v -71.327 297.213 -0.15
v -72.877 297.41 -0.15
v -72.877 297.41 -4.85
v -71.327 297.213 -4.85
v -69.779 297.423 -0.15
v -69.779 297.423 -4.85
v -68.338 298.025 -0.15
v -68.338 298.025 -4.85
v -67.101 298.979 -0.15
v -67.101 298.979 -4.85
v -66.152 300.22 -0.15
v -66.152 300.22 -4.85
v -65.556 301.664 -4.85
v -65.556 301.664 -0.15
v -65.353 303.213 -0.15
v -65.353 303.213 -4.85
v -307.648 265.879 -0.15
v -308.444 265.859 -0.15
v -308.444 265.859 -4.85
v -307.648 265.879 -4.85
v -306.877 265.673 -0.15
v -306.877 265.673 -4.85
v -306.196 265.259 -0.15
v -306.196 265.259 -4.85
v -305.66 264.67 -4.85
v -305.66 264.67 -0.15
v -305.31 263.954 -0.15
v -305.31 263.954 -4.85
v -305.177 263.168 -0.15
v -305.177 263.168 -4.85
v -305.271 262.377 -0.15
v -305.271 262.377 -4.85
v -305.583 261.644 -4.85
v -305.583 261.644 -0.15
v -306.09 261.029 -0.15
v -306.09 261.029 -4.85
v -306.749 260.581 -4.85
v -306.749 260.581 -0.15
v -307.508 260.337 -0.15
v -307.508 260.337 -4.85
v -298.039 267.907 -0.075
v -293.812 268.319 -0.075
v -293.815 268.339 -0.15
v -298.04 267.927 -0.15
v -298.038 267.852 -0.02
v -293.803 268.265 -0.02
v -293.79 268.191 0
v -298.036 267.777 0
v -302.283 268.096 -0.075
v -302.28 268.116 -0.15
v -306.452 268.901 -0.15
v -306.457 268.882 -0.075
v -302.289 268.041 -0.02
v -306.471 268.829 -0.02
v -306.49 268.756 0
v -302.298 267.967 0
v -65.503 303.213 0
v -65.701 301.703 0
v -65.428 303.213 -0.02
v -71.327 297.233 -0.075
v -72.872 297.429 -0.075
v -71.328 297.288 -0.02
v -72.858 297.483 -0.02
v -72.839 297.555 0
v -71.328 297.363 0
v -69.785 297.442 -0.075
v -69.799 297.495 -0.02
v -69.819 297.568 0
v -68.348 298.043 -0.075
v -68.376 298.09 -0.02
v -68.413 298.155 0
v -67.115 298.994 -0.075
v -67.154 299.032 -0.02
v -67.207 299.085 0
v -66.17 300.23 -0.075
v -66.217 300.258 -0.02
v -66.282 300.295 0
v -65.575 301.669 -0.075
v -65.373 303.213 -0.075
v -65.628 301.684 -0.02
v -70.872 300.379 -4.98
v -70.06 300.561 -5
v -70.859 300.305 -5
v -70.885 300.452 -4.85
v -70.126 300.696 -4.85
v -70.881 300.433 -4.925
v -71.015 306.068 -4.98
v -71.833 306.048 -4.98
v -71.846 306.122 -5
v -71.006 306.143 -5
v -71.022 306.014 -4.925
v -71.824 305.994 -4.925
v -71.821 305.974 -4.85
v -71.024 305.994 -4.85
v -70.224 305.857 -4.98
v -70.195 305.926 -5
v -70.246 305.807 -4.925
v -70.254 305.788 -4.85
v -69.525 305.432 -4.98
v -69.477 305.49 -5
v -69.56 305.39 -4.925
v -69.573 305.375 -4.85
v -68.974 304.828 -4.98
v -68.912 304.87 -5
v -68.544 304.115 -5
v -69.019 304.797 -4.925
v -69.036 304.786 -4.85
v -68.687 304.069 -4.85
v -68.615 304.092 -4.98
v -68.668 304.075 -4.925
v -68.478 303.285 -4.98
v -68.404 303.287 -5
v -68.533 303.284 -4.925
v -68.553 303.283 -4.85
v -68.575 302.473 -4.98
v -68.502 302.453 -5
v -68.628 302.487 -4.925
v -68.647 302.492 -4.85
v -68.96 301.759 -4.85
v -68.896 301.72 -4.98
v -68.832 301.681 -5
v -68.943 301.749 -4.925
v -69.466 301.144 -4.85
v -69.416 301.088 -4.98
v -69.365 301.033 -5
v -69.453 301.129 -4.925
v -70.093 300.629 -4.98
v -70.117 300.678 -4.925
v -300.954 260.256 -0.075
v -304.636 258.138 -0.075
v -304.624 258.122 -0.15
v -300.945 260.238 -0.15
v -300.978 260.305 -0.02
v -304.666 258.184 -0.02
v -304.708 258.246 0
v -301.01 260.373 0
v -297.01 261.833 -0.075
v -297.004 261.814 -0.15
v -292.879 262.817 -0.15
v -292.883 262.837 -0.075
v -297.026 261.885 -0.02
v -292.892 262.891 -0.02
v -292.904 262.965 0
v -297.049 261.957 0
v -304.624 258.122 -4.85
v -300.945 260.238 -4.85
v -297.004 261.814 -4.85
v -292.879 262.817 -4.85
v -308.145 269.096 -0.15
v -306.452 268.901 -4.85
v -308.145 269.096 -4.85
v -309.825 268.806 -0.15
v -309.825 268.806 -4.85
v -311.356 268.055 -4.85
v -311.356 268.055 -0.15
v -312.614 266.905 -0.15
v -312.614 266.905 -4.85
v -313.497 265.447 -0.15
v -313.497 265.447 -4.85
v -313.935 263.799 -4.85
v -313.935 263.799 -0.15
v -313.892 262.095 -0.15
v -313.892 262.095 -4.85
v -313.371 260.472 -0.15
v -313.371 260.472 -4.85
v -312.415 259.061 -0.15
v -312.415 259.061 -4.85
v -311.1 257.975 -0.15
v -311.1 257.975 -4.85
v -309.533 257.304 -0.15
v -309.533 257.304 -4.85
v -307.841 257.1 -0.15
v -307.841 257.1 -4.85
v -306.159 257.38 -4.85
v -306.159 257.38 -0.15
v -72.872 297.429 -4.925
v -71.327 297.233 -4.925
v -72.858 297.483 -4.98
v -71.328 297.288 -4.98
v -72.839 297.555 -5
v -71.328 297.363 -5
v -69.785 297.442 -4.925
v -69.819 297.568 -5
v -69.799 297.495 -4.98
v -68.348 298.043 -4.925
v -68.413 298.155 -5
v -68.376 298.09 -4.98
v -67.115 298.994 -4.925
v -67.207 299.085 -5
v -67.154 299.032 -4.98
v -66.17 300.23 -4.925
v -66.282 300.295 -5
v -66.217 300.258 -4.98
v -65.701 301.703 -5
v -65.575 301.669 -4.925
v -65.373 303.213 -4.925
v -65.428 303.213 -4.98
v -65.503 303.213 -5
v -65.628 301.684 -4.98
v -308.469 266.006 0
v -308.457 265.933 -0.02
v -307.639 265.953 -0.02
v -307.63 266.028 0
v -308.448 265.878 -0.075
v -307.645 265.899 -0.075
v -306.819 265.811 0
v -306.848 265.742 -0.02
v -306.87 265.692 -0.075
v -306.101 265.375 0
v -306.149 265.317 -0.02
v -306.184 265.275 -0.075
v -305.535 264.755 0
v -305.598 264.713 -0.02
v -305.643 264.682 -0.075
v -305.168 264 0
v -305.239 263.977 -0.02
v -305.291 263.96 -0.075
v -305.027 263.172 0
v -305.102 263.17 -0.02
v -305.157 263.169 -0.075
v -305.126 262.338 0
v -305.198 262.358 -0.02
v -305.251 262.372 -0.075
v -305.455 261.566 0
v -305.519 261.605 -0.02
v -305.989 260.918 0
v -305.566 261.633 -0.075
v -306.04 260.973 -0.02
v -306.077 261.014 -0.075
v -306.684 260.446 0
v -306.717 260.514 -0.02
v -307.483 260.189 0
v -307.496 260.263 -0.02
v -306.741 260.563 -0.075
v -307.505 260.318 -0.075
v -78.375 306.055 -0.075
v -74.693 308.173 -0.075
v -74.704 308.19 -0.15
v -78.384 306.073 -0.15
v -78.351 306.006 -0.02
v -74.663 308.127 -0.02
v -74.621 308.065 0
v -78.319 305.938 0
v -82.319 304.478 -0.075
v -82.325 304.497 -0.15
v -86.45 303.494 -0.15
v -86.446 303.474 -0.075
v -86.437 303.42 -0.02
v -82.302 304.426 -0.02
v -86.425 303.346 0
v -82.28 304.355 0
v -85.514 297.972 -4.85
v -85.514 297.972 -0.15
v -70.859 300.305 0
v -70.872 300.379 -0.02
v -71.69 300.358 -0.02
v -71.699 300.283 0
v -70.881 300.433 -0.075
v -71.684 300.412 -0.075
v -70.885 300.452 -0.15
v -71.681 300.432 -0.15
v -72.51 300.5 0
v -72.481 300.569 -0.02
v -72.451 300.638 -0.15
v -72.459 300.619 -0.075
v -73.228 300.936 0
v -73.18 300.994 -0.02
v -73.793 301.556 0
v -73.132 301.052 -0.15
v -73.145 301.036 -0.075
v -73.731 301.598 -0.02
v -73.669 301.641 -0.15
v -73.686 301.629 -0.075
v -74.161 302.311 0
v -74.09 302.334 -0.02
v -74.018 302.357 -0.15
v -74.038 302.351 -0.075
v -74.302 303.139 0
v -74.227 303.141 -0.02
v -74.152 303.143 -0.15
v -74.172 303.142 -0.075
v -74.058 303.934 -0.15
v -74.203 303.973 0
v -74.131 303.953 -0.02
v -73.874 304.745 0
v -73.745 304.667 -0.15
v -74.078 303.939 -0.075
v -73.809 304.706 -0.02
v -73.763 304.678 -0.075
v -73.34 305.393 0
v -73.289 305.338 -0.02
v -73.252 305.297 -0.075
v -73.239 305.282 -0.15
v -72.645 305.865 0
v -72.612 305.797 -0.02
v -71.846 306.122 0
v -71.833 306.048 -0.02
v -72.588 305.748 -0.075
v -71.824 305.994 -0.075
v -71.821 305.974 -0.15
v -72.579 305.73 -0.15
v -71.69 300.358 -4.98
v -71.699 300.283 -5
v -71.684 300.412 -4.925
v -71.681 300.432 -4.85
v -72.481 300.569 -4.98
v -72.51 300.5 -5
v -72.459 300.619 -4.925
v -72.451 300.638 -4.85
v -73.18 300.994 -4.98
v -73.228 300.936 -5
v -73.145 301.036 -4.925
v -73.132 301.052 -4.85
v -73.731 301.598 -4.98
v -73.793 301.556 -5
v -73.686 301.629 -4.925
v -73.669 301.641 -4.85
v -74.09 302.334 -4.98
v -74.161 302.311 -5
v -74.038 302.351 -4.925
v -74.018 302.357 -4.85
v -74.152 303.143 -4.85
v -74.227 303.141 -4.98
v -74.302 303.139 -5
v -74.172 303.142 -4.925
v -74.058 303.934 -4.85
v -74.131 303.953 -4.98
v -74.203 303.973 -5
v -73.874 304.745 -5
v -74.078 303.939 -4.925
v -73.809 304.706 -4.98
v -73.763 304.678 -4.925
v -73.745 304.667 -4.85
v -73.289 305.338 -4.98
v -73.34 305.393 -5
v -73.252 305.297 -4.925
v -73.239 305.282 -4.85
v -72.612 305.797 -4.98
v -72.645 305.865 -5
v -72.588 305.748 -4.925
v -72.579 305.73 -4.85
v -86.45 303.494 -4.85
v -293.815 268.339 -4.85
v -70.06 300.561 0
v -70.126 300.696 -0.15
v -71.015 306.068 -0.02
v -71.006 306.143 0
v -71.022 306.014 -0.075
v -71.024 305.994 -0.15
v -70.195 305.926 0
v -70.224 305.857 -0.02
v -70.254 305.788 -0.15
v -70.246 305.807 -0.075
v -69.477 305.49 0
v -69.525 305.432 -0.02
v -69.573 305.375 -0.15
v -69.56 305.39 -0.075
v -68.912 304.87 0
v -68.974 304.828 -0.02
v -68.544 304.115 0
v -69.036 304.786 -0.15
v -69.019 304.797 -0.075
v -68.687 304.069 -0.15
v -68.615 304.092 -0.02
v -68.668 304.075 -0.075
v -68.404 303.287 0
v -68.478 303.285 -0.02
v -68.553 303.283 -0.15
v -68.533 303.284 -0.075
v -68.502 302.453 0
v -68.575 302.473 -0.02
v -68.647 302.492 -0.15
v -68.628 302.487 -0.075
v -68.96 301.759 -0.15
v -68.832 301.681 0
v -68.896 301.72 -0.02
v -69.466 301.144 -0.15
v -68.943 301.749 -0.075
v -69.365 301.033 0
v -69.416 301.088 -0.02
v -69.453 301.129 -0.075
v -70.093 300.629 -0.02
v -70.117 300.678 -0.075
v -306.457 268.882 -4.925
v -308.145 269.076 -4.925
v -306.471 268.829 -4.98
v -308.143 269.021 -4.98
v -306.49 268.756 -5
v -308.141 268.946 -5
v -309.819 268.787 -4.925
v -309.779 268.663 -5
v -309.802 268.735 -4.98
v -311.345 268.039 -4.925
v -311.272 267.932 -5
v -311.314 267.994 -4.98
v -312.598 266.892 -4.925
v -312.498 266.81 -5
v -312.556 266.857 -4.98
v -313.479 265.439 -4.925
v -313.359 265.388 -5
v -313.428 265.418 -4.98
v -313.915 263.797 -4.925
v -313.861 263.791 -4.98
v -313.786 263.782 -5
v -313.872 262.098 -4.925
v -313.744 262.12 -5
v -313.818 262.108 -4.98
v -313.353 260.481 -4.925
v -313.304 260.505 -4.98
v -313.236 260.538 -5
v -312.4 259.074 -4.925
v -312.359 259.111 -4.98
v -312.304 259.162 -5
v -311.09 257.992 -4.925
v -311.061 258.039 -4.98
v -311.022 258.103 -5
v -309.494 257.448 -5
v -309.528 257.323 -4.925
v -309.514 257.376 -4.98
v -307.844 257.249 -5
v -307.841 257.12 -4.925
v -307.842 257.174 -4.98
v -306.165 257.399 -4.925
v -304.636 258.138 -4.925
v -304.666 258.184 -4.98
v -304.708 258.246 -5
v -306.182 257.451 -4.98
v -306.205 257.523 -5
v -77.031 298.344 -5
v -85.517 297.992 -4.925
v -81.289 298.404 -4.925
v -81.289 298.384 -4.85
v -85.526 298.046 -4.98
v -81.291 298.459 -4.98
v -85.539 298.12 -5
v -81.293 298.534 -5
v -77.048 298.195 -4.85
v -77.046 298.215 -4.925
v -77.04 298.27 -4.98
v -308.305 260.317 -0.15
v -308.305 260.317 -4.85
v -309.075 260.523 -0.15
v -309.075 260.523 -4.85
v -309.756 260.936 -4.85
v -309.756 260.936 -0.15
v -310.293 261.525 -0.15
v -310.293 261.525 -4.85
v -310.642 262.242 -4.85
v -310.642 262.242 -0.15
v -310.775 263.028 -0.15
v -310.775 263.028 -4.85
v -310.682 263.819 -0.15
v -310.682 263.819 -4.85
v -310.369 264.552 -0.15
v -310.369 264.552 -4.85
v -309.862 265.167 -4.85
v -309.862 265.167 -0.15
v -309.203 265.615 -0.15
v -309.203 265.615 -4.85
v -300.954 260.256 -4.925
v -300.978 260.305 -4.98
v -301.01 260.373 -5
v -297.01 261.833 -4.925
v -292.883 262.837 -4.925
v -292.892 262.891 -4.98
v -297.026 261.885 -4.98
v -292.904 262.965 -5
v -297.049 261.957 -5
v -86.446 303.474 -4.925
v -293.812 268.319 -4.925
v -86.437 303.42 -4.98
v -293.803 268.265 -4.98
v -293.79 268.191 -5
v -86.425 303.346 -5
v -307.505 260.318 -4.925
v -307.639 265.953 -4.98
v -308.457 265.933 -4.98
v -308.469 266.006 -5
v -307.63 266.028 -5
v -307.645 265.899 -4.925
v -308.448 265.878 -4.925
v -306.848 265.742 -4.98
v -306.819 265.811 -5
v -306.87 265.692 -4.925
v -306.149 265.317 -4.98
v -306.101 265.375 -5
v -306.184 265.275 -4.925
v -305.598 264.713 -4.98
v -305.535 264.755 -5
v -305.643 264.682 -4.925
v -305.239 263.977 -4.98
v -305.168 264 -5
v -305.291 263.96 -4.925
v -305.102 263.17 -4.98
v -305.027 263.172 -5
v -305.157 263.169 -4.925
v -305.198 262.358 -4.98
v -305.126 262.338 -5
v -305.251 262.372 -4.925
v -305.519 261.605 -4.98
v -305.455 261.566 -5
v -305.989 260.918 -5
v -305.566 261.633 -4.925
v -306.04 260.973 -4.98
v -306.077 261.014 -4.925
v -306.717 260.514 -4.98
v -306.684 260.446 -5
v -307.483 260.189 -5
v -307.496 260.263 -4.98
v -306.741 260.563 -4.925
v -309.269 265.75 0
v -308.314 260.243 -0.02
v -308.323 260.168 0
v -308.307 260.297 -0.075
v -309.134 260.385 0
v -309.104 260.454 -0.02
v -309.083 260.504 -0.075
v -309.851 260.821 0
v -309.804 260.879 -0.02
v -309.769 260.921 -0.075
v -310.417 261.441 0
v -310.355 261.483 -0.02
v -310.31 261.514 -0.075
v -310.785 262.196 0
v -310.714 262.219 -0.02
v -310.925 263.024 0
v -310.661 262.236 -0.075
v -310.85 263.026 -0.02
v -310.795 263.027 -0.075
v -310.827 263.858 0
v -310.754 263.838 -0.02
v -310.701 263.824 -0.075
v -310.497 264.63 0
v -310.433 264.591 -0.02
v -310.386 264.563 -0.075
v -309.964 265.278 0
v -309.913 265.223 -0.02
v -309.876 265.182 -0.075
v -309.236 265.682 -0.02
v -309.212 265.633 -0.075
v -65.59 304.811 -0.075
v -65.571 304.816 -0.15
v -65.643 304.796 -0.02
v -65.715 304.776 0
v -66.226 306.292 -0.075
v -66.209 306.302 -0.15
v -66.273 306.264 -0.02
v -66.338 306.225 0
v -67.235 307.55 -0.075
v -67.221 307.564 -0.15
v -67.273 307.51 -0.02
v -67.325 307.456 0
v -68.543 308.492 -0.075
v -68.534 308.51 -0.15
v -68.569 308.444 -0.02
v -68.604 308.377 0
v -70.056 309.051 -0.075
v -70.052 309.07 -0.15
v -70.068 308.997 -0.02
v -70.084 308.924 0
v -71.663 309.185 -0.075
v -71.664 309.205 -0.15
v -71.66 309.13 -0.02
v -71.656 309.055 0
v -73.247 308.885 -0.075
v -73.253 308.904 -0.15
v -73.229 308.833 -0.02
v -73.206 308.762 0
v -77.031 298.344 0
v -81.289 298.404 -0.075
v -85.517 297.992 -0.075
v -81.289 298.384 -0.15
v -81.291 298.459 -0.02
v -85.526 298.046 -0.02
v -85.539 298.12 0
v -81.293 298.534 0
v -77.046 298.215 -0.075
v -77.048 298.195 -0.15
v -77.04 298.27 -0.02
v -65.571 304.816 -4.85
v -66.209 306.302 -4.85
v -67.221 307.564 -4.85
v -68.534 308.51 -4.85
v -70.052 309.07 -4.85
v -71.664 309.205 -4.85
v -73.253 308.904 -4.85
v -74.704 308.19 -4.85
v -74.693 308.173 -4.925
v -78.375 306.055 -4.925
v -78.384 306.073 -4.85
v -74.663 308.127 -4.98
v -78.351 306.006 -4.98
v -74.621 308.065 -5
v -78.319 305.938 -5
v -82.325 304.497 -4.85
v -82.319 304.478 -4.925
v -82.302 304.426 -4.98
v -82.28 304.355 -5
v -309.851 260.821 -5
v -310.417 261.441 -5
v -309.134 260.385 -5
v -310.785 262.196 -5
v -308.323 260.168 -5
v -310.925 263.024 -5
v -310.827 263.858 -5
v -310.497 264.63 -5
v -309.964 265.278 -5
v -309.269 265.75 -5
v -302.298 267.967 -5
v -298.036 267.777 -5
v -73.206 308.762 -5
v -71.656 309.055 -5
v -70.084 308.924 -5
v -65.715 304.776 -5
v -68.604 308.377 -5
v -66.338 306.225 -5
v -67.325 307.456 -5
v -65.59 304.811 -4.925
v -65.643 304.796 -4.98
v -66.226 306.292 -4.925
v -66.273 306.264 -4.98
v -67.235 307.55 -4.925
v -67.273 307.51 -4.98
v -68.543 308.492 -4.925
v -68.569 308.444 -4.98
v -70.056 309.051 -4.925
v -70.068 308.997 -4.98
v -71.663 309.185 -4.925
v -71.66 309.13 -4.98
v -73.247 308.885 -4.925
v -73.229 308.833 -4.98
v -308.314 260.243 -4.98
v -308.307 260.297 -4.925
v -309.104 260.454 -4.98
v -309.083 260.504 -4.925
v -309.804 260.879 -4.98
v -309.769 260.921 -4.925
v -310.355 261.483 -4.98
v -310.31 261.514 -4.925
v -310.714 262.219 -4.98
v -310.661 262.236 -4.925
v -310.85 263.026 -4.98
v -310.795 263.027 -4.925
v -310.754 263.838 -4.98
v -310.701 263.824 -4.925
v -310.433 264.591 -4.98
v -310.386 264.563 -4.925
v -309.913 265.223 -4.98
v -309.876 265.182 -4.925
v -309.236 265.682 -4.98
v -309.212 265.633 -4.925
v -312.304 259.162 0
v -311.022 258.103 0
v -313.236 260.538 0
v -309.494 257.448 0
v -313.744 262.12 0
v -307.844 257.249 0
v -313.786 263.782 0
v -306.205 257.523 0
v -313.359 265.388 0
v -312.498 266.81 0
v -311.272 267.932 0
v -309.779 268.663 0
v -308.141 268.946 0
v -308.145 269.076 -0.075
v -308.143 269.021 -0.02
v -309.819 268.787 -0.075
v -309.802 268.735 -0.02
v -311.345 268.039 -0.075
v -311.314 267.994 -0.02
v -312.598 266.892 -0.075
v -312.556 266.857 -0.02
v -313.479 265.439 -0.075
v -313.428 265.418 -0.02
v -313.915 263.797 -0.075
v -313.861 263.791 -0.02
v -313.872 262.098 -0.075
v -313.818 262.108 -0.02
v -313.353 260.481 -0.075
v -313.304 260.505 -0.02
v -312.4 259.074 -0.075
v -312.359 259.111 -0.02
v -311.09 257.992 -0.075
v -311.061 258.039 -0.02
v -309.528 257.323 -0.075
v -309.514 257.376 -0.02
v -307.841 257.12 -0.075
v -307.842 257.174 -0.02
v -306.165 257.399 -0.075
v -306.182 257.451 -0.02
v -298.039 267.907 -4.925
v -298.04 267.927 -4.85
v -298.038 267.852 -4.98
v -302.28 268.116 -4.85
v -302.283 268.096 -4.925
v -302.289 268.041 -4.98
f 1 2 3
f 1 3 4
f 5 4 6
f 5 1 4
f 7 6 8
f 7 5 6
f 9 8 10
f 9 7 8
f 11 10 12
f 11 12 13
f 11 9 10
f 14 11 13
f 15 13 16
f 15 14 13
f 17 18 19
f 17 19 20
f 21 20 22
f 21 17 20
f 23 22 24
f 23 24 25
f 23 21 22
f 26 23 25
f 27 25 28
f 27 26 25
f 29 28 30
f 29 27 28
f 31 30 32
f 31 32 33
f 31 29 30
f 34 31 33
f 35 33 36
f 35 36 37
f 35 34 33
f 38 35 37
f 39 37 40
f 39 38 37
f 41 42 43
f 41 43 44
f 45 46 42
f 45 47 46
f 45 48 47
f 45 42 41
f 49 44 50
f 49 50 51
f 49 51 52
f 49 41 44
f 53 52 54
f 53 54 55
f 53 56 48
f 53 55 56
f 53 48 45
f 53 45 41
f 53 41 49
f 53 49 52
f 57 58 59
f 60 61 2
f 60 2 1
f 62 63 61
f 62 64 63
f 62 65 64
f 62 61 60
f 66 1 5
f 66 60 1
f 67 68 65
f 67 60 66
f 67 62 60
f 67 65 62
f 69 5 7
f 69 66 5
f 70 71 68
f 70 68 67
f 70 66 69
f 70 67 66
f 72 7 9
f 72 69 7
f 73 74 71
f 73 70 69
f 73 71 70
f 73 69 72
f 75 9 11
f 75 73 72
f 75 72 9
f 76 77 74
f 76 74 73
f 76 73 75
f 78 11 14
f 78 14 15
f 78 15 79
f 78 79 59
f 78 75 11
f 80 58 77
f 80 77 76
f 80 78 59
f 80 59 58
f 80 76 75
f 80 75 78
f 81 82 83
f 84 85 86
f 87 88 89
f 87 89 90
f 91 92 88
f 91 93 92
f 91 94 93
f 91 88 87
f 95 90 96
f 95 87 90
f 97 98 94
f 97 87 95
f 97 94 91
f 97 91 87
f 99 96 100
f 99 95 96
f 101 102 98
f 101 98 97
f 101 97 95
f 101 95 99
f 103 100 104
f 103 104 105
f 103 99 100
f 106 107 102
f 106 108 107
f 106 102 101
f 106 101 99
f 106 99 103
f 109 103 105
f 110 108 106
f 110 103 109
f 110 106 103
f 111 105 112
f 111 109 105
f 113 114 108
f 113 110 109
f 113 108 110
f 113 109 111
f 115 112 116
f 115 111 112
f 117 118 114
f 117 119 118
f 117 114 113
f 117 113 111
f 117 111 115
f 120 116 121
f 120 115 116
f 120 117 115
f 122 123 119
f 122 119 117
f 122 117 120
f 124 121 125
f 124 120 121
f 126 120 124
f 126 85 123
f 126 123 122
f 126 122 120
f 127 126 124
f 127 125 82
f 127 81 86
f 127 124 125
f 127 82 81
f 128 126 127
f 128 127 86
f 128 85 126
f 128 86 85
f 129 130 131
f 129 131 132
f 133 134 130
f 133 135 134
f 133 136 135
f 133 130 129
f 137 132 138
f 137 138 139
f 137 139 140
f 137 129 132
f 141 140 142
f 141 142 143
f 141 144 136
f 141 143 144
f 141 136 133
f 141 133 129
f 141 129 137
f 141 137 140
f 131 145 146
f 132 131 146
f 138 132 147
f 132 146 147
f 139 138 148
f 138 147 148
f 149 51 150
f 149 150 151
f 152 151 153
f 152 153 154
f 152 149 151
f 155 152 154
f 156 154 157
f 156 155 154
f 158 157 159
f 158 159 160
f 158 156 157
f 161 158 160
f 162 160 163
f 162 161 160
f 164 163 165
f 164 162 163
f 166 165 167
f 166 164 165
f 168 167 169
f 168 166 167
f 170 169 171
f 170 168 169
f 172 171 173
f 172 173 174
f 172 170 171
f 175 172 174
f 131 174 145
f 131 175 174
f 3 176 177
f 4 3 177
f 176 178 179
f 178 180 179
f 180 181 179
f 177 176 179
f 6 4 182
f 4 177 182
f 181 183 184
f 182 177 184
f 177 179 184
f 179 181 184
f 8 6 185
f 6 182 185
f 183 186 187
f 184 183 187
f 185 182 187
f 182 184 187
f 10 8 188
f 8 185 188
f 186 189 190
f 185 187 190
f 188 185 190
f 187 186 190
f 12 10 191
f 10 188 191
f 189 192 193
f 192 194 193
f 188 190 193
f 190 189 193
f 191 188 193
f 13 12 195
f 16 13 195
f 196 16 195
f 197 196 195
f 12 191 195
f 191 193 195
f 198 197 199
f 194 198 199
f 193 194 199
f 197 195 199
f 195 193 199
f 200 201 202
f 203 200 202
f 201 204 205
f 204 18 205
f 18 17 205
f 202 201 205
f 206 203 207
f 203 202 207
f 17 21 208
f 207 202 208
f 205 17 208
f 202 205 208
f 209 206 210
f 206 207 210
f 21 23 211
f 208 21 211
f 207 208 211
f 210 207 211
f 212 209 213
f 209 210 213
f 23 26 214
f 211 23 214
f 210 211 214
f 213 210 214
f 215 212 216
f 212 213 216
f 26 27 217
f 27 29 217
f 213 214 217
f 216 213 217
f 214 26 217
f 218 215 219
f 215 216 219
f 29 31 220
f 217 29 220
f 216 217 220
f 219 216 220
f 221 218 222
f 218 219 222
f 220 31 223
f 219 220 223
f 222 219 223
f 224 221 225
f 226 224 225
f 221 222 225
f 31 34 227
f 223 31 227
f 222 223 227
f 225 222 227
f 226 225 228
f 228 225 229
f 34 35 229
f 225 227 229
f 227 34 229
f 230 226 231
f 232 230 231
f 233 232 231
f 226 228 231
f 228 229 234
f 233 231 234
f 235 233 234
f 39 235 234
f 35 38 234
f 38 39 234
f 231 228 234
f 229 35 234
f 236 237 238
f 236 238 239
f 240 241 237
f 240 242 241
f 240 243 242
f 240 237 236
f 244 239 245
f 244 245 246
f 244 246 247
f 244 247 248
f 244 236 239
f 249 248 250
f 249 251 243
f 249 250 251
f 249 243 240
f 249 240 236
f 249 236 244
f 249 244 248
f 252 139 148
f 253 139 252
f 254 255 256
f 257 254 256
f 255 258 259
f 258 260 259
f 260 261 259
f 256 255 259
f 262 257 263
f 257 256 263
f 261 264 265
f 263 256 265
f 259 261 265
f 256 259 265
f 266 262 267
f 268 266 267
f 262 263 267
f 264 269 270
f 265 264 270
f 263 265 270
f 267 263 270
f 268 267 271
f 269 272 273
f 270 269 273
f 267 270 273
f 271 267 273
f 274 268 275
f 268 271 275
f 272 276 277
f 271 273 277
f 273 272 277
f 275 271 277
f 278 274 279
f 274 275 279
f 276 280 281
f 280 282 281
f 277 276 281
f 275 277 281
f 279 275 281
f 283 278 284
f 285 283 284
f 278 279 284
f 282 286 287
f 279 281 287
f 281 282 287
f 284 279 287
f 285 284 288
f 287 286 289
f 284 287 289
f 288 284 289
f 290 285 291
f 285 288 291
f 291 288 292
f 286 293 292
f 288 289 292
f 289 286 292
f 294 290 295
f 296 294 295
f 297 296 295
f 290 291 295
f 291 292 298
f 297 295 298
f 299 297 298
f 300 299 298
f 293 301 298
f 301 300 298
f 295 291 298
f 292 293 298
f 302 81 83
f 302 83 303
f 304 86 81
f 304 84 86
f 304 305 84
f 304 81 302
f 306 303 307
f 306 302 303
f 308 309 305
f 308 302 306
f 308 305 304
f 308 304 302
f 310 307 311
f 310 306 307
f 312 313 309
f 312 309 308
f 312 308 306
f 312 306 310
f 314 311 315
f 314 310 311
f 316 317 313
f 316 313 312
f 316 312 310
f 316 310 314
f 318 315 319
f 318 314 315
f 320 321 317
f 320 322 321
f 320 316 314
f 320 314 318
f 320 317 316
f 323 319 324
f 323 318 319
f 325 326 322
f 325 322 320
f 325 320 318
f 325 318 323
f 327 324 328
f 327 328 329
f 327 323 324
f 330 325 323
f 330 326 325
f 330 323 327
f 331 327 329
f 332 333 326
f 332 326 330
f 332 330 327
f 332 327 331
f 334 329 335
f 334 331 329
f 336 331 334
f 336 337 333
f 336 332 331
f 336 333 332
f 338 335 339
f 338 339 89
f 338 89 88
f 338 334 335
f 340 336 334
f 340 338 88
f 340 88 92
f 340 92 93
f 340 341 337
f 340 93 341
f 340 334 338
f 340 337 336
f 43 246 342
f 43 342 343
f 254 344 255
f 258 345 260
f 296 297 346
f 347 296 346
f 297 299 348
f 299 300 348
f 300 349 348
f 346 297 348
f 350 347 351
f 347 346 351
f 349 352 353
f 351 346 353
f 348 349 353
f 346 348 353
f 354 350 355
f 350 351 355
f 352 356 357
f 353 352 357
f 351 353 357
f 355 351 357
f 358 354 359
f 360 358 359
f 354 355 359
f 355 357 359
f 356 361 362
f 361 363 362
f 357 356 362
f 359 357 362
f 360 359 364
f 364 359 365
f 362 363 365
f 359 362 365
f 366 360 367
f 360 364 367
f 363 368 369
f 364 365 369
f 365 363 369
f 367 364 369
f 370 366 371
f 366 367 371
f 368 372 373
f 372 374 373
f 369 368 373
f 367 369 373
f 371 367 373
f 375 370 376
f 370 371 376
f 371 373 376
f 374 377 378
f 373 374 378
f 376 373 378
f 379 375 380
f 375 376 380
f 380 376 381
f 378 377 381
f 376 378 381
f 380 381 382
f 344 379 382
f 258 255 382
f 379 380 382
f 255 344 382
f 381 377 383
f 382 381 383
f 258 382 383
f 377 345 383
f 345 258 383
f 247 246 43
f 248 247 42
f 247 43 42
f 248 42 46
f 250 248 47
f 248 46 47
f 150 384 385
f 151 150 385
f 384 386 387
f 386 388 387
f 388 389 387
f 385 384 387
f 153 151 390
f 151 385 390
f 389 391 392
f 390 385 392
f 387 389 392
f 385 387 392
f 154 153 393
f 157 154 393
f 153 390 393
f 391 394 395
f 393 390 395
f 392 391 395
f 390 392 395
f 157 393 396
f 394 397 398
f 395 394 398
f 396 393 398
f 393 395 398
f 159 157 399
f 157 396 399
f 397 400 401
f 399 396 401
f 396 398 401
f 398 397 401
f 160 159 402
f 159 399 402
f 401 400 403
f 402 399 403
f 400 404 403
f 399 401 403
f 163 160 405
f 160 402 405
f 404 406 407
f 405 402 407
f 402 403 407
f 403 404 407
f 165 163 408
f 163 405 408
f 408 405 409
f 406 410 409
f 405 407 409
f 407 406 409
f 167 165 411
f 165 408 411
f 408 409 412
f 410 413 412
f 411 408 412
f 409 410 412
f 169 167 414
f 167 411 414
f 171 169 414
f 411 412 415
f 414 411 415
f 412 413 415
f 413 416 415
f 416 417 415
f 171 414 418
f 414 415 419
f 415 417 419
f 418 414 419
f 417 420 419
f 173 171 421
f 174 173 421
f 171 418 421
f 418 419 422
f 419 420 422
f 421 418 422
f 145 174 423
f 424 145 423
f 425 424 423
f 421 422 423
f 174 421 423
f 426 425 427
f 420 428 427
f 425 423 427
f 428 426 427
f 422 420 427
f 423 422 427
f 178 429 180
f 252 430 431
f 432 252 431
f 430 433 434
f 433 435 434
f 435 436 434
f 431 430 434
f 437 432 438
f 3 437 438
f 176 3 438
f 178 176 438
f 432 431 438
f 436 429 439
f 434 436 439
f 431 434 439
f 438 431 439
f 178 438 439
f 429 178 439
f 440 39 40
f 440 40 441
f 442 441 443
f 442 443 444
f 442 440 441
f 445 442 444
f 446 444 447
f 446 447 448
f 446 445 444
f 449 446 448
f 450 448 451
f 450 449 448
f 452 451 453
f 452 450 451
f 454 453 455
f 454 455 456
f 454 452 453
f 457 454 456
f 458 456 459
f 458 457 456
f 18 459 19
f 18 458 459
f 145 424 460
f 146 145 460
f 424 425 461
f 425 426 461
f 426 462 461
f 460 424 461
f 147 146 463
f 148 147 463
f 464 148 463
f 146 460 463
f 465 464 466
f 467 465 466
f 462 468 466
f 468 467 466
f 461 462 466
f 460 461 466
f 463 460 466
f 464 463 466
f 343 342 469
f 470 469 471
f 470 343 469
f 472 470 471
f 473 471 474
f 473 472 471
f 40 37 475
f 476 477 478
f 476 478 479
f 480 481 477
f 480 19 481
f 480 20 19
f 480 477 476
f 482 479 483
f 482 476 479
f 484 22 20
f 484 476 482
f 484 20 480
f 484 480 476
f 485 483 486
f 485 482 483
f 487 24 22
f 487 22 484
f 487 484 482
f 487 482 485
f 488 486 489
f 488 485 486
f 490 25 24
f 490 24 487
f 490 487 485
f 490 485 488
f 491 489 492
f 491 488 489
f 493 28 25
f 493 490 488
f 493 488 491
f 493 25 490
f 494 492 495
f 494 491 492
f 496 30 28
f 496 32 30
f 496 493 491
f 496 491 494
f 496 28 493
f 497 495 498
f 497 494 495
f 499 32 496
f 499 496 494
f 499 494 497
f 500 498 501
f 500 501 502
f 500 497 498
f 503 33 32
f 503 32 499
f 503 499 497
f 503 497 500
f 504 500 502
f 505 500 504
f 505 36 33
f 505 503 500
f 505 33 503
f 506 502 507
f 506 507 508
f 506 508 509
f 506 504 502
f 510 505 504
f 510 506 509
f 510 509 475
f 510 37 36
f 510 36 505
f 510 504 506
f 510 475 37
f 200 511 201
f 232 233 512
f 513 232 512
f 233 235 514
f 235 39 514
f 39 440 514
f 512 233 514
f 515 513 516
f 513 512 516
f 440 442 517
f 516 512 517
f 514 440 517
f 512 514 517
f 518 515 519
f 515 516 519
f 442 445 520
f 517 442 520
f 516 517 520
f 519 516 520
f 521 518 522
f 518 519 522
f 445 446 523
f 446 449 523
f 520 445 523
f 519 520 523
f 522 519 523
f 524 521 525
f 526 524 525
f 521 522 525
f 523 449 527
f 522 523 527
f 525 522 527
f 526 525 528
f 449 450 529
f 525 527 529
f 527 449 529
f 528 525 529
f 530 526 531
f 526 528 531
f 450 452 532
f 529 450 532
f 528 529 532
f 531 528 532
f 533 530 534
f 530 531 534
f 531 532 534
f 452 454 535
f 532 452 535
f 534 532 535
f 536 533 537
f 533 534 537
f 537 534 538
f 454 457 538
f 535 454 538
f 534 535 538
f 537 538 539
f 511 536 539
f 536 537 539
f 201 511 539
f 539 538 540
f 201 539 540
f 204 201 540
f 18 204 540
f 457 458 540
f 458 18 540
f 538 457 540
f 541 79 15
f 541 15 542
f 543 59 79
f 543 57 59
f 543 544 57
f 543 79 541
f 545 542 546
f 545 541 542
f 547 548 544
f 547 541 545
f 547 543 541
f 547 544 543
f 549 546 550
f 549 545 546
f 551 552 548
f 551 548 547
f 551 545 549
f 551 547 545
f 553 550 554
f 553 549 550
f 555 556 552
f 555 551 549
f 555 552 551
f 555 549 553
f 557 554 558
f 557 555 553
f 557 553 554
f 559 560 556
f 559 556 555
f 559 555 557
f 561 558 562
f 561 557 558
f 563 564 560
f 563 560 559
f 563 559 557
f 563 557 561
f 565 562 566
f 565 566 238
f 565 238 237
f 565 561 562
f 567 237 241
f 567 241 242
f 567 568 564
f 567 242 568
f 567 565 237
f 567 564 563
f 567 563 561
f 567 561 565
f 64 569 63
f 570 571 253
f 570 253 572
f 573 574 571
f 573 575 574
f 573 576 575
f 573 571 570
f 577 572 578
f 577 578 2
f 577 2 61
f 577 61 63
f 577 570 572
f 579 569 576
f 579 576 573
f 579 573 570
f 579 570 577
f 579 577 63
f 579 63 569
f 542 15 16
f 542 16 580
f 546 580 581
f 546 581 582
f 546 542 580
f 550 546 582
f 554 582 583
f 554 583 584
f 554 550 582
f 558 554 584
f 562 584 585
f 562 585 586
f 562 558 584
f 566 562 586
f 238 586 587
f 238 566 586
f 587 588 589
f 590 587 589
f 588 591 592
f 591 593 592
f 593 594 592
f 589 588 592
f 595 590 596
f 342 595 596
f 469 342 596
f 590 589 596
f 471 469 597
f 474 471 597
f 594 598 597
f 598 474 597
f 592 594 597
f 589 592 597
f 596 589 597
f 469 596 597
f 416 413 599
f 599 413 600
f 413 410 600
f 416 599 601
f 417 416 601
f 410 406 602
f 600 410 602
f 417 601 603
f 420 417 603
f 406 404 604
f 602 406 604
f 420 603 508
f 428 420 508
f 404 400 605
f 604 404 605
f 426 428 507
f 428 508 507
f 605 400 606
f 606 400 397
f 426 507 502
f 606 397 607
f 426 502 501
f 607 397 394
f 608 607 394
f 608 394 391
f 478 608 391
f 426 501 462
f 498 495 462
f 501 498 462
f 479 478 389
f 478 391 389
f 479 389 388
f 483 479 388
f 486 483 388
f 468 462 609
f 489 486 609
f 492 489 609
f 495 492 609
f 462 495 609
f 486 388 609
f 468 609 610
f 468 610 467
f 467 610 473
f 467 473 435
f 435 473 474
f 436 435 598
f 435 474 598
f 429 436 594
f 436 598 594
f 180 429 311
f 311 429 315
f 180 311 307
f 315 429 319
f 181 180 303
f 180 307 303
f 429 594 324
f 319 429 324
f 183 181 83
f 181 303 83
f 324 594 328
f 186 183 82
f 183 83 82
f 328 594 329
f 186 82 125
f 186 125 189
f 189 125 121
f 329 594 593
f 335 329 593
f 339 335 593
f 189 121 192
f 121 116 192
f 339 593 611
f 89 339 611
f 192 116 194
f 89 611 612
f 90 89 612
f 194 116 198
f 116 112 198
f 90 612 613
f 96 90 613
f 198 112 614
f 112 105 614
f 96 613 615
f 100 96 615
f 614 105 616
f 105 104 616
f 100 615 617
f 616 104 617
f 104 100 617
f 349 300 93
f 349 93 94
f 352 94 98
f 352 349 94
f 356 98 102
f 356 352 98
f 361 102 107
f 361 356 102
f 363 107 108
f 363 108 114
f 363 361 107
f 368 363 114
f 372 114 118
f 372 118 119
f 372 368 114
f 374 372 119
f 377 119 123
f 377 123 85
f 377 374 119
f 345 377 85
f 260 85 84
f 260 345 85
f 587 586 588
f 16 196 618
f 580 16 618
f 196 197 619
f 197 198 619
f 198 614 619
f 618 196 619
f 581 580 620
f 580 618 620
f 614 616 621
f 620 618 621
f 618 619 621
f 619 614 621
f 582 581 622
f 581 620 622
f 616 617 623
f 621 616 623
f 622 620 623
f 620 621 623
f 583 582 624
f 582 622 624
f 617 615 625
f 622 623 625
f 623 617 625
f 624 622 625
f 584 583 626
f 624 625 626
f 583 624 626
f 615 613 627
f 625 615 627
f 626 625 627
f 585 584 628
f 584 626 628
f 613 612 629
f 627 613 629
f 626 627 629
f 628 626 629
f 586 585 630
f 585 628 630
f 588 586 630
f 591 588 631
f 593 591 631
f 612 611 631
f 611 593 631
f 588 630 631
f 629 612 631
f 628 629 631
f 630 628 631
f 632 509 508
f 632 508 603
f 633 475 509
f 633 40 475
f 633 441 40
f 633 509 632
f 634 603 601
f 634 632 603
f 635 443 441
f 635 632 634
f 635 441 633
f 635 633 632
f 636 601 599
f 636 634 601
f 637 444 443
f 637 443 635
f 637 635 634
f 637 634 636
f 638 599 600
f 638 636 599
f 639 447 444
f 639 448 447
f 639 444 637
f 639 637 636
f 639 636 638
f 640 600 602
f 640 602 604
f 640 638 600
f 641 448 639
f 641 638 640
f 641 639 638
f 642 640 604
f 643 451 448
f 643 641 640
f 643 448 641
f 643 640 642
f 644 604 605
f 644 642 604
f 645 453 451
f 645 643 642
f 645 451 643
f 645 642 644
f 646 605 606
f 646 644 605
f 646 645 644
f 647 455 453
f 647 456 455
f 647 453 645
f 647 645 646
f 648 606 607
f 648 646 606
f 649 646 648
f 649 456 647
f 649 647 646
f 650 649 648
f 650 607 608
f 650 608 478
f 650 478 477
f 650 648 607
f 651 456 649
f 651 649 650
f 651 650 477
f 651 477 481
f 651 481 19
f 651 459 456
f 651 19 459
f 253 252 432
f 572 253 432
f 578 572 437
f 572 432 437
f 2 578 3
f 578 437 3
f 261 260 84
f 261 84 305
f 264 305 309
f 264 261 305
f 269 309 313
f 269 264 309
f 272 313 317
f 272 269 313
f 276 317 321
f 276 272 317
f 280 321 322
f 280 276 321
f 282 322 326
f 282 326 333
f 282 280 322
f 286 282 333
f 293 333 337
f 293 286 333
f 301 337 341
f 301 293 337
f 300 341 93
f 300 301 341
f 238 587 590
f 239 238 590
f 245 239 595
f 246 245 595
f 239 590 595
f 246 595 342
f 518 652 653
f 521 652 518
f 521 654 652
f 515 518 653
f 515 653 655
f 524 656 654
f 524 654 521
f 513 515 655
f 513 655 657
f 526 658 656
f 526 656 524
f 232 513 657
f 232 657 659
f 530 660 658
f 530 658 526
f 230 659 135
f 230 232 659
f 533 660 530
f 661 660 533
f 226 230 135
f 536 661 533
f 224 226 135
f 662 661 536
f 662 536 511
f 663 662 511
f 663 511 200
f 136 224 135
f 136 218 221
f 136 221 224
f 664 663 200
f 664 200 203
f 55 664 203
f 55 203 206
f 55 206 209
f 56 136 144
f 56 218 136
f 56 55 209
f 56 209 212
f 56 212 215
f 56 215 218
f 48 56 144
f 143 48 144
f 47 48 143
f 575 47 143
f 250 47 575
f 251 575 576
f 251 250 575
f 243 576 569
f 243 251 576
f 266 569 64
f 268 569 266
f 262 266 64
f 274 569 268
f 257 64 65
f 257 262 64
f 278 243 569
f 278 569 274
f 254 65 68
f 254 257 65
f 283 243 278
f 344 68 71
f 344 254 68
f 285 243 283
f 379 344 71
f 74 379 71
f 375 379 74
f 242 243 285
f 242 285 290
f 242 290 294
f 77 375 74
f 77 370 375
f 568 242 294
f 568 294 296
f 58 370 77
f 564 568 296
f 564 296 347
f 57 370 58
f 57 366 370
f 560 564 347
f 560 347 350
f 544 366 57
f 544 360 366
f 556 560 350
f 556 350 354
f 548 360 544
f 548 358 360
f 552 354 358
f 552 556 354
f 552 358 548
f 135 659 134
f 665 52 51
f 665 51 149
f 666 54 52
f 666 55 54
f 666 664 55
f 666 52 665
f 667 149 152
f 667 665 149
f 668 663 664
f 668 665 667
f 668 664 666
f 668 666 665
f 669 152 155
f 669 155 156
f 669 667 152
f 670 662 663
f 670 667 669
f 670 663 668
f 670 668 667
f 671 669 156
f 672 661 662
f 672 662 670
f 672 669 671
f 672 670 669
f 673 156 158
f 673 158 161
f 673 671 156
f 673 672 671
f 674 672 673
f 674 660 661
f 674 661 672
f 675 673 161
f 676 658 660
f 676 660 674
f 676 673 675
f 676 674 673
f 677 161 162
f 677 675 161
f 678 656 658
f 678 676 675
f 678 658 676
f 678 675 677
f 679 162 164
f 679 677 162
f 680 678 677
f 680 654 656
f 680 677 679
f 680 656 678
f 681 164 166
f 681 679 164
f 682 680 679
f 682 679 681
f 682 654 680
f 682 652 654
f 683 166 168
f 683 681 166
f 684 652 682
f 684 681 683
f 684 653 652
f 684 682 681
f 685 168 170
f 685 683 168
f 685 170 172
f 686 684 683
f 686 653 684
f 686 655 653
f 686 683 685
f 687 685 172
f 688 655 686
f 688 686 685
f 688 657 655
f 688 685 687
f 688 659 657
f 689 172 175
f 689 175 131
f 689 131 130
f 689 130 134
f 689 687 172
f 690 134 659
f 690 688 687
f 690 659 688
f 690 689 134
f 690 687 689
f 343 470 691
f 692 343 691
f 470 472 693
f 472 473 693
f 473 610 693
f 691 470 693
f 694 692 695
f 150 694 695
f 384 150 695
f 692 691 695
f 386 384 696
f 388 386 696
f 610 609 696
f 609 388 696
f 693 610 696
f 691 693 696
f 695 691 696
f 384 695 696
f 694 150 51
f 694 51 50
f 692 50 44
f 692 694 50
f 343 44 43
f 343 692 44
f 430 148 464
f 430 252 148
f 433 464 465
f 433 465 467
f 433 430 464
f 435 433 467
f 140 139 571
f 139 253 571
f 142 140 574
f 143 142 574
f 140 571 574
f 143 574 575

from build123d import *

# Parameters (mm, degrees)
BOSS_EXTRUDE1_DEPTH = 5
FILLET1_R           = 30
FILLET2_R           = 0.15


with BuildPart() as part:
    # Sketch1 → Boss-Extrude1 (new body)
    with BuildSketch(Plane.XY):
        with BuildLine():
            ThreePointArc((-307.508268688, 260.337372781), (-310.736888168, 262.629973107), (-308.444287841, 265.858592586))
            Line((-308.444287841, 265.858592586), (-303.212340846, 266.745570965))
            ThreePointArc((-303.212340846, 266.745570965), (-313.891870914, 262.09510502), (-302.276321694, 261.22435116))
            Line((-302.276321694, 261.22435116), (-307.508268688, 260.337372781))
        make_face()
        with BuildLine():
            Line((-303.212340846, 266.745570965), (-308.444287841, 265.858592586))
            ThreePointArc((-308.444287841, 265.858592586), (-305.215668362, 263.56599226), (-307.508268688, 260.337372781))
            Line((-307.508268688, 260.337372781), (-302.276321694, 261.22435116))
            ThreePointArc((-302.276321694, 261.22435116), (-302.051763963, 262.149230721), (-301.976278265, 263.097982683))
            ThreePointArc((-301.976278265, 263.097982683), (-302.293689748, 265.023648217), (-303.212340846, 266.745570965))
        make_face()
        with BuildLine():
            ThreePointArc((-65.352572296, 303.213089234), (-70.403820333, 309.137603536), (-77.052528867, 305.086720758))
            Line((-77.052528867, 305.086720758), (-71.820581872, 305.973699137))
            ThreePointArc((-71.820581872, 305.973699137), (-68.591962393, 303.68109881), (-70.884562719, 300.452479331))
            Line((-70.884562719, 300.452479331), (-76.116509714, 299.565500952))
            ThreePointArc((-76.116509714, 299.565500952), (-69.426906763, 297.530500717), (-65.352572296, 303.213089234))
        make_face()
        with BuildLine():
            Line((-71.820581872, 305.973699137), (-77.052528867, 305.086720758))
            ThreePointArc((-77.052528867, 305.086720758), (-77.268164945, 302.21021157), (-76.116509714, 299.565500952))
            Line((-76.116509714, 299.565500952), (-70.884562719, 300.452479331))
            ThreePointArc((-70.884562719, 300.452479331), (-74.113182199, 302.745079658), (-71.820581872, 305.973699137))
        make_face()
        with BuildLine():
            Line((-77.052528867, 305.086720758), (-303.212340846, 266.745570965))
            ThreePointArc((-303.212340846, 266.745570965), (-302.293689748, 265.023648217), (-301.976278265, 263.097982683))
            ThreePointArc((-301.976278265, 263.097982683), (-302.051763963, 262.149230721), (-302.276321694, 261.22435116))
            Line((-302.276321694, 261.22435116), (-76.116509714, 299.565500952))
            ThreePointArc((-76.116509714, 299.565500952), (-77.268164945, 302.21021157), (-77.052528867, 305.086720758))
        make_face()
    extrude(amount=-BOSS_EXTRUDE1_DEPTH)

    # Fillet1
    fillet1_edges = [part.edges().sort_by_distance(p)[0] for p in [
        (-303.212340846, 266.745570965, -2.5),
        (-77.052528867, 305.086720758, -2.5),
        (-76.116509714, 299.565500952, -2.5),
        (-302.276321694, 261.22435116, -2.5),
    ]]
    fillet(fillet1_edges, radius=FILLET1_R)

    # Fillet2
    fillet2_edges = [part.edges().sort_by_distance(p)[0] for p in [
        (-71.820581872, 305.973699137, 0),
        (-313.891870914, 262.09510502, 0),
        (-313.891870914, 262.09510502, -5),
        (-189.196415704, 280.394926056, 0),
        (-189.196415704, 280.394926056, -5),
        (-65.436979647, 304.215966898, 0),
        (-65.436979647, 304.215966898, -5),
        (-190.132434857, 285.916145862, 0),
        (-190.132434857, 285.916145862, -5),
        (-299.0021004, 261.095569977, 0),
        (-299.0021004, 261.095569977, -5),
        (-79.165336458, 298.364765695, 0),
        (-308.444287841, 265.858592586, -5),
        (-79.165336458, 298.364765695, -5),
        (-80.326750161, 305.21550194, 0),
        (-80.326750161, 305.21550194, -5),
        (-300.163514102, 267.946306222, 0),
        (-300.163514102, 267.946306222, -5),
        (-71.820581872, 305.973699137, -5),
        (-308.444287841, 265.858592586, 0),
    ]]
    fillet(fillet2_edges, radius=FILLET2_R)


solid = part.part
